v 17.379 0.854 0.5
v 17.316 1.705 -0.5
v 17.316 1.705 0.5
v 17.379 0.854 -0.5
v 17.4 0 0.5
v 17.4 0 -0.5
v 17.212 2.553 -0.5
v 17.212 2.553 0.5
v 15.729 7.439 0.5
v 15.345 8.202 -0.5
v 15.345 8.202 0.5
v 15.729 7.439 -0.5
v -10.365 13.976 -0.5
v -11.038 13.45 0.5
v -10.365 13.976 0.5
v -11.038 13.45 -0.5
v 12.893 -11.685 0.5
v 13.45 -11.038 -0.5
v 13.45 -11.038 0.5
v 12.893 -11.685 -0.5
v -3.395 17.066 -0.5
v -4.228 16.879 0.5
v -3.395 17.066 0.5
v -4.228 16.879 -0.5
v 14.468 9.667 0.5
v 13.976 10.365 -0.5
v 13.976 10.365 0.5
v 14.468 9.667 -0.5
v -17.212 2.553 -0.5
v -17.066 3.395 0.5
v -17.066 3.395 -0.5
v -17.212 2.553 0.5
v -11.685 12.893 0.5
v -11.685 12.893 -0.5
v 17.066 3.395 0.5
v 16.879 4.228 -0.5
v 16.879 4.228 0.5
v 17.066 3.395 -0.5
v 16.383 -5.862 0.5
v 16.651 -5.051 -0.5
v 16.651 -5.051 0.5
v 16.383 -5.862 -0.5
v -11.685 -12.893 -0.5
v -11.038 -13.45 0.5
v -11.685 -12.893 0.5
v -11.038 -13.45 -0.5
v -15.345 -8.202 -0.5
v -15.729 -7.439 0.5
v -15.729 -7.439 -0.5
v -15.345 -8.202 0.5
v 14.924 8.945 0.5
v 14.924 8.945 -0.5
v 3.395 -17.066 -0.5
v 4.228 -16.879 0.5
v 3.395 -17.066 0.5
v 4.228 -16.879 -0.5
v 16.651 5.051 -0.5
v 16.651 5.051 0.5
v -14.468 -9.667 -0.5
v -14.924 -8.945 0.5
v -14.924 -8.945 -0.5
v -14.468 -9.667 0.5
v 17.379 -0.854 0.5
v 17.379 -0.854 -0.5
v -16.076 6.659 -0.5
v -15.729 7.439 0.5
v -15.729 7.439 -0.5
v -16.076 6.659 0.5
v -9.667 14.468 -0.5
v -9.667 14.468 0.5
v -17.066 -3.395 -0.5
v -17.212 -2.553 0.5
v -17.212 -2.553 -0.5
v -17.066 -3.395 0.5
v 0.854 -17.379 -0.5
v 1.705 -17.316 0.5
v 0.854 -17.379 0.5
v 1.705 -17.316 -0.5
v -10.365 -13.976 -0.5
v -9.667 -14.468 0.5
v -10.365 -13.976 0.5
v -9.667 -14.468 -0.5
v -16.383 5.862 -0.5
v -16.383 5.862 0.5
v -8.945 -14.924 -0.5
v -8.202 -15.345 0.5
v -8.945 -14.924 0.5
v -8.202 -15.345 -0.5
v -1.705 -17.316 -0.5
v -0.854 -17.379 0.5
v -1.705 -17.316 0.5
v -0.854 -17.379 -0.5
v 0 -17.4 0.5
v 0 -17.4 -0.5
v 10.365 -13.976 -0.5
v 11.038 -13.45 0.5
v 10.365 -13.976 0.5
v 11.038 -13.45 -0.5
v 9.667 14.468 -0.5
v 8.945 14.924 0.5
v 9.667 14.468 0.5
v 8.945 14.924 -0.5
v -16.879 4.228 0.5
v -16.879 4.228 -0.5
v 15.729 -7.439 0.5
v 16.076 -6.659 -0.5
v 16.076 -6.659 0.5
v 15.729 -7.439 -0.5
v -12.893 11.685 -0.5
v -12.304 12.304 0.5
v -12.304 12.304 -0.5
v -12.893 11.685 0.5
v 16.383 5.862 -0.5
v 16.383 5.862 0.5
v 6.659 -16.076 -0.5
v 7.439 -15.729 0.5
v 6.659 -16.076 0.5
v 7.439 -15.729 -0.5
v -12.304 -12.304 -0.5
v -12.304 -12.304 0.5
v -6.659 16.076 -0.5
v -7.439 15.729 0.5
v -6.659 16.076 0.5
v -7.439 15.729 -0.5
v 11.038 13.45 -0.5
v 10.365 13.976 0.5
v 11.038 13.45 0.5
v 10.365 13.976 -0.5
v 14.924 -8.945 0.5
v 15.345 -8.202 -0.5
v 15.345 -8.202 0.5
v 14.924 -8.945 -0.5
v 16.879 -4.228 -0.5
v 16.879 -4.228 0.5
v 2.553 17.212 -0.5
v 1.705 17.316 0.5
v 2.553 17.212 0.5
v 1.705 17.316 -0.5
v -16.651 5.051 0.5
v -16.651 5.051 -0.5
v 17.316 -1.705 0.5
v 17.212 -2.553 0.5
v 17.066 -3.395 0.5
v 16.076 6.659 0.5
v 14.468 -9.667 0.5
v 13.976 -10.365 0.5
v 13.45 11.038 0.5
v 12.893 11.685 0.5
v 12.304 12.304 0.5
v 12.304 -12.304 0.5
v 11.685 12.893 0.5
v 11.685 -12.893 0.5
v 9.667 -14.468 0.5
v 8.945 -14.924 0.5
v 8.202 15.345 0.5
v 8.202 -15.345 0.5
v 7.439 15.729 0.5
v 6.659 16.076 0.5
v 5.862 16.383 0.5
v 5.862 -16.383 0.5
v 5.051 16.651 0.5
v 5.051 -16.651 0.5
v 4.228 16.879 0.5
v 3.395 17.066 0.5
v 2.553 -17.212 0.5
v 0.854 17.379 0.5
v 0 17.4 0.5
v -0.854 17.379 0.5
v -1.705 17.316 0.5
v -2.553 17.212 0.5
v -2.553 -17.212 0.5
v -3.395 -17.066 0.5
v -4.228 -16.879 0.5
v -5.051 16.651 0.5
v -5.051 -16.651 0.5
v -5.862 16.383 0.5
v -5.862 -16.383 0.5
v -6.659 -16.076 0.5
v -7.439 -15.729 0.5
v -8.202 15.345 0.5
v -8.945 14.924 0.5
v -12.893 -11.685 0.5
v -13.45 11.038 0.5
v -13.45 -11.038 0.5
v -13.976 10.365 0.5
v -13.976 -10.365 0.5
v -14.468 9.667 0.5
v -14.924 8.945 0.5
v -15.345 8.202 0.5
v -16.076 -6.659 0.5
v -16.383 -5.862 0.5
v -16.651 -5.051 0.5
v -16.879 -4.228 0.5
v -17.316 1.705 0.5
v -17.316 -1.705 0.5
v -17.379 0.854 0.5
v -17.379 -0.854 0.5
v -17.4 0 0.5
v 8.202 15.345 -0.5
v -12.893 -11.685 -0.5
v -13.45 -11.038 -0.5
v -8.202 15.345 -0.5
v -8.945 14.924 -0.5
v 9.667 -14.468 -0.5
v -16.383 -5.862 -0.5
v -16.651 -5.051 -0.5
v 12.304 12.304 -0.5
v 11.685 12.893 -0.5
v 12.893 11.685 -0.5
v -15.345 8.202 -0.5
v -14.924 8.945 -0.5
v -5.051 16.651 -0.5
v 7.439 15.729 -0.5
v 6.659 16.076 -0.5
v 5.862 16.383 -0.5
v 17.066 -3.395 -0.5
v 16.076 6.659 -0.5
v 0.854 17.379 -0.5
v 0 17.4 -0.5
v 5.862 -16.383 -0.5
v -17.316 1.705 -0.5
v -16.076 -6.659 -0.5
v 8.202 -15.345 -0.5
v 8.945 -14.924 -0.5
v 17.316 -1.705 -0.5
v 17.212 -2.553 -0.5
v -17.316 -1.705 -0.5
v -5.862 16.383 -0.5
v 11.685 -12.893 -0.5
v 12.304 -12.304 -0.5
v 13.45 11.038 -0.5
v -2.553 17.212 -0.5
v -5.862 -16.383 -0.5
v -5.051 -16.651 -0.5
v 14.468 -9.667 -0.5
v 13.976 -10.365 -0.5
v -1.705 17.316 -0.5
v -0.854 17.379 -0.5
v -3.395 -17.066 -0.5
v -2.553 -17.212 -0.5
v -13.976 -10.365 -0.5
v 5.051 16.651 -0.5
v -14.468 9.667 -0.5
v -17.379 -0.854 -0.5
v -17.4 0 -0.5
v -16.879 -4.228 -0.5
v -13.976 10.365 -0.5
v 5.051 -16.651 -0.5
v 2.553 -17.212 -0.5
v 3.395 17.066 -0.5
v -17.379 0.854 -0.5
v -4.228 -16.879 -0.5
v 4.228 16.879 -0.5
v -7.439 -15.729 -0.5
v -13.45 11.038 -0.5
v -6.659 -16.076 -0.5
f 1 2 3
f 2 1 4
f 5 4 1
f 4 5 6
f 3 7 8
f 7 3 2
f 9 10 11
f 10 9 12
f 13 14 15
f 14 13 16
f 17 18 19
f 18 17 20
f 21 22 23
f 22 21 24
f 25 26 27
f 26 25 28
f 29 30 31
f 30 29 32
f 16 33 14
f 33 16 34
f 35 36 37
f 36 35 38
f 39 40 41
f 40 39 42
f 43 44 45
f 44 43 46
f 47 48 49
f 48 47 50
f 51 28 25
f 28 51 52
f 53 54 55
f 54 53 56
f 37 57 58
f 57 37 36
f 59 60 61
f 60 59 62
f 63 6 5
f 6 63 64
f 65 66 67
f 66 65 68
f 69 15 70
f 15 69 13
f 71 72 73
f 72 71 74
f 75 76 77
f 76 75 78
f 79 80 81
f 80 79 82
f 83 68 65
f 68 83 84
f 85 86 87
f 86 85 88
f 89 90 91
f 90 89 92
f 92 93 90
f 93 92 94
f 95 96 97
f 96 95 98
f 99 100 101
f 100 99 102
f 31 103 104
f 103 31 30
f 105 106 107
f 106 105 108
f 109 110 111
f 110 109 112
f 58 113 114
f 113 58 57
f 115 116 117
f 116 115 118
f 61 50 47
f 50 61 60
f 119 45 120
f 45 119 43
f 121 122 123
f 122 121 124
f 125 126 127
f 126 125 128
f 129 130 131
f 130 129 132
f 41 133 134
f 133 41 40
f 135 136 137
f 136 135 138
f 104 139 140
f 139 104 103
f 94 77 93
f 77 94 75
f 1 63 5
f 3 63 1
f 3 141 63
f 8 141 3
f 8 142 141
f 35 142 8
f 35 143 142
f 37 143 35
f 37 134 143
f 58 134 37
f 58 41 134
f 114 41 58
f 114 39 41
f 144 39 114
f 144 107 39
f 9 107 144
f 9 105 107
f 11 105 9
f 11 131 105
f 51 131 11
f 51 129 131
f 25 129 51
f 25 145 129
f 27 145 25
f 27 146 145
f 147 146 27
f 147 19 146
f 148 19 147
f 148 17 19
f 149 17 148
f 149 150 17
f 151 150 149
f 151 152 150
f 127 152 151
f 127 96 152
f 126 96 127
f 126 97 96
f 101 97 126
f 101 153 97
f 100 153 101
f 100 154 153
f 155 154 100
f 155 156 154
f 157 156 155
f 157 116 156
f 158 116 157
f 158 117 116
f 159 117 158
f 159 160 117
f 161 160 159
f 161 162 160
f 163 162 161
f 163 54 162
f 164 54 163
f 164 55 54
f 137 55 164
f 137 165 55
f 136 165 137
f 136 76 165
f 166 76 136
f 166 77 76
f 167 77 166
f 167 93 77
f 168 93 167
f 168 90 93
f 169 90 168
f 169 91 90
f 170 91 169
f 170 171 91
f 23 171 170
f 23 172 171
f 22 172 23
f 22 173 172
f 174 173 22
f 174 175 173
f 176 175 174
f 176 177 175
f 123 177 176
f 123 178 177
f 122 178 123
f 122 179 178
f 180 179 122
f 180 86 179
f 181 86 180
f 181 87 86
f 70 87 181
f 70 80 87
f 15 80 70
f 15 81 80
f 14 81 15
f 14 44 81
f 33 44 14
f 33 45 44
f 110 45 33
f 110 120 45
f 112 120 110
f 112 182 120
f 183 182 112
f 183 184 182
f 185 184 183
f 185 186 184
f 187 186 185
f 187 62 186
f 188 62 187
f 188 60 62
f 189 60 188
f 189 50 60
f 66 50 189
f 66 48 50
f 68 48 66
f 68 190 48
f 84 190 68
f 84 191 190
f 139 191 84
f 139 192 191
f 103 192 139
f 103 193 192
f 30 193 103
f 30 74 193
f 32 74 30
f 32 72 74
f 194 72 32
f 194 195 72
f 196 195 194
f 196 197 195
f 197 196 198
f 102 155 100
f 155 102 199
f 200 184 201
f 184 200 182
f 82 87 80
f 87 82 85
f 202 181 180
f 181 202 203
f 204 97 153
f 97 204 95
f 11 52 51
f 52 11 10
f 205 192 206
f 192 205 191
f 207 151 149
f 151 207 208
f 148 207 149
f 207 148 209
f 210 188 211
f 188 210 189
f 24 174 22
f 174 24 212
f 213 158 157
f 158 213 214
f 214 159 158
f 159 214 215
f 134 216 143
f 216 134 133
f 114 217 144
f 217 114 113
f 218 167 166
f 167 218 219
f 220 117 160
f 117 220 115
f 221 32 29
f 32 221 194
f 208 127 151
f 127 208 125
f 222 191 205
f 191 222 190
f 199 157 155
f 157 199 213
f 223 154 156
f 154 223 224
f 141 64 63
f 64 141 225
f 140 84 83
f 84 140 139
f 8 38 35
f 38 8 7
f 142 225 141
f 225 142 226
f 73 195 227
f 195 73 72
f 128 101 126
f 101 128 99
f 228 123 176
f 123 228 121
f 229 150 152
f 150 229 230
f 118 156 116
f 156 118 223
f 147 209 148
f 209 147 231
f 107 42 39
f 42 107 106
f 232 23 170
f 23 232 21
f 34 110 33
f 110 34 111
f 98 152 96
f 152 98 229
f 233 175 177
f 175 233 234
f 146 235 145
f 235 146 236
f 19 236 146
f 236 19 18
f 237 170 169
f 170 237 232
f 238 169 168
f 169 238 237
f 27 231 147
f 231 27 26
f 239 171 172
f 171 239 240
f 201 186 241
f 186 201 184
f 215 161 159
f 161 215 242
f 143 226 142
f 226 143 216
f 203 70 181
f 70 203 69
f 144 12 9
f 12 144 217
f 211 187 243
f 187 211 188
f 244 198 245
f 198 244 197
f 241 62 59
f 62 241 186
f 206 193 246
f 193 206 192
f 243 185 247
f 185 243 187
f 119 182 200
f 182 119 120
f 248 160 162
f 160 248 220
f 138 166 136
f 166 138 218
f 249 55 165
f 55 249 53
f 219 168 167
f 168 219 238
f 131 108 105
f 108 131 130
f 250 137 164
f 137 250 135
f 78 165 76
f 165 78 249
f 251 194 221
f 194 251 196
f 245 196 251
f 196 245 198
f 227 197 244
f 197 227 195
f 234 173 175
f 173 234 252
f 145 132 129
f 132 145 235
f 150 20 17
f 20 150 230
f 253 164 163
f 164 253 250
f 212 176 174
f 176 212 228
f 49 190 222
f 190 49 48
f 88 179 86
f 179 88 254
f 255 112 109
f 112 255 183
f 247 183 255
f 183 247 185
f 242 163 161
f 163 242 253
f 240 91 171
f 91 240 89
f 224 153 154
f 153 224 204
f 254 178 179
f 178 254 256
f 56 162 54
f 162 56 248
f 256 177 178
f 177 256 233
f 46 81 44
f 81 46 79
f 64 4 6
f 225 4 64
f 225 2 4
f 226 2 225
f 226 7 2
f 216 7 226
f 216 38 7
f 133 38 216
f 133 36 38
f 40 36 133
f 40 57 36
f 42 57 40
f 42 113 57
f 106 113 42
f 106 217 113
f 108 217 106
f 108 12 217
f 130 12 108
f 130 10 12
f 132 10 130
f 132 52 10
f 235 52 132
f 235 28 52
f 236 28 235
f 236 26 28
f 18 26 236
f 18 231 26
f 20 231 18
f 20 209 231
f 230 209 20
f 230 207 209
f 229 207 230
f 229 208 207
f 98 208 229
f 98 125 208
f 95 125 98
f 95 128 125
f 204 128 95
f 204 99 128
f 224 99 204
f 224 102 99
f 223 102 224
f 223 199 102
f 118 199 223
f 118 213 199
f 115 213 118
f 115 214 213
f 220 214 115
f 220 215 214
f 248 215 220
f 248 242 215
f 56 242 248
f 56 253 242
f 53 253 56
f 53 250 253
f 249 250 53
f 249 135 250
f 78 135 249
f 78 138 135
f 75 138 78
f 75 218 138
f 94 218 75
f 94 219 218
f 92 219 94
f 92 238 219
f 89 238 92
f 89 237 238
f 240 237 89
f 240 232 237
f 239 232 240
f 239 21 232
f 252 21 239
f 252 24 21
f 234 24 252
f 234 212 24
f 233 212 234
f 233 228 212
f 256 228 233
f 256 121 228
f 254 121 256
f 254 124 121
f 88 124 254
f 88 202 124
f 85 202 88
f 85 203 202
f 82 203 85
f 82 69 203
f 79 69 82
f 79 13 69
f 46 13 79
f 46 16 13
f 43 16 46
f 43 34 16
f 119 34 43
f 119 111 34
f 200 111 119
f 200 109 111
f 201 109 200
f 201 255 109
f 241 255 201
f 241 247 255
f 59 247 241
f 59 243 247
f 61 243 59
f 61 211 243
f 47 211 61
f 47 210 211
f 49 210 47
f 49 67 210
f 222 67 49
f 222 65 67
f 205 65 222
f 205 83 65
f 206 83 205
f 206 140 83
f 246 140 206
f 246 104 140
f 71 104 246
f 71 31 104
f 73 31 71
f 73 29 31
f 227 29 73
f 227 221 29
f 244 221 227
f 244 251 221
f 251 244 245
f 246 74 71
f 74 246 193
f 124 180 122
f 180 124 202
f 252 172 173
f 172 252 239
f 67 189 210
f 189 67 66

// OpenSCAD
$fn = 128;

radii = [17.4, 11.4, 9, 0.5];

module radial(rs, h=1) {
    union() {
        for (r = rs)
            cylinder(h=h, r=r, center=true);
    }
}

radial(radii, h=1);
